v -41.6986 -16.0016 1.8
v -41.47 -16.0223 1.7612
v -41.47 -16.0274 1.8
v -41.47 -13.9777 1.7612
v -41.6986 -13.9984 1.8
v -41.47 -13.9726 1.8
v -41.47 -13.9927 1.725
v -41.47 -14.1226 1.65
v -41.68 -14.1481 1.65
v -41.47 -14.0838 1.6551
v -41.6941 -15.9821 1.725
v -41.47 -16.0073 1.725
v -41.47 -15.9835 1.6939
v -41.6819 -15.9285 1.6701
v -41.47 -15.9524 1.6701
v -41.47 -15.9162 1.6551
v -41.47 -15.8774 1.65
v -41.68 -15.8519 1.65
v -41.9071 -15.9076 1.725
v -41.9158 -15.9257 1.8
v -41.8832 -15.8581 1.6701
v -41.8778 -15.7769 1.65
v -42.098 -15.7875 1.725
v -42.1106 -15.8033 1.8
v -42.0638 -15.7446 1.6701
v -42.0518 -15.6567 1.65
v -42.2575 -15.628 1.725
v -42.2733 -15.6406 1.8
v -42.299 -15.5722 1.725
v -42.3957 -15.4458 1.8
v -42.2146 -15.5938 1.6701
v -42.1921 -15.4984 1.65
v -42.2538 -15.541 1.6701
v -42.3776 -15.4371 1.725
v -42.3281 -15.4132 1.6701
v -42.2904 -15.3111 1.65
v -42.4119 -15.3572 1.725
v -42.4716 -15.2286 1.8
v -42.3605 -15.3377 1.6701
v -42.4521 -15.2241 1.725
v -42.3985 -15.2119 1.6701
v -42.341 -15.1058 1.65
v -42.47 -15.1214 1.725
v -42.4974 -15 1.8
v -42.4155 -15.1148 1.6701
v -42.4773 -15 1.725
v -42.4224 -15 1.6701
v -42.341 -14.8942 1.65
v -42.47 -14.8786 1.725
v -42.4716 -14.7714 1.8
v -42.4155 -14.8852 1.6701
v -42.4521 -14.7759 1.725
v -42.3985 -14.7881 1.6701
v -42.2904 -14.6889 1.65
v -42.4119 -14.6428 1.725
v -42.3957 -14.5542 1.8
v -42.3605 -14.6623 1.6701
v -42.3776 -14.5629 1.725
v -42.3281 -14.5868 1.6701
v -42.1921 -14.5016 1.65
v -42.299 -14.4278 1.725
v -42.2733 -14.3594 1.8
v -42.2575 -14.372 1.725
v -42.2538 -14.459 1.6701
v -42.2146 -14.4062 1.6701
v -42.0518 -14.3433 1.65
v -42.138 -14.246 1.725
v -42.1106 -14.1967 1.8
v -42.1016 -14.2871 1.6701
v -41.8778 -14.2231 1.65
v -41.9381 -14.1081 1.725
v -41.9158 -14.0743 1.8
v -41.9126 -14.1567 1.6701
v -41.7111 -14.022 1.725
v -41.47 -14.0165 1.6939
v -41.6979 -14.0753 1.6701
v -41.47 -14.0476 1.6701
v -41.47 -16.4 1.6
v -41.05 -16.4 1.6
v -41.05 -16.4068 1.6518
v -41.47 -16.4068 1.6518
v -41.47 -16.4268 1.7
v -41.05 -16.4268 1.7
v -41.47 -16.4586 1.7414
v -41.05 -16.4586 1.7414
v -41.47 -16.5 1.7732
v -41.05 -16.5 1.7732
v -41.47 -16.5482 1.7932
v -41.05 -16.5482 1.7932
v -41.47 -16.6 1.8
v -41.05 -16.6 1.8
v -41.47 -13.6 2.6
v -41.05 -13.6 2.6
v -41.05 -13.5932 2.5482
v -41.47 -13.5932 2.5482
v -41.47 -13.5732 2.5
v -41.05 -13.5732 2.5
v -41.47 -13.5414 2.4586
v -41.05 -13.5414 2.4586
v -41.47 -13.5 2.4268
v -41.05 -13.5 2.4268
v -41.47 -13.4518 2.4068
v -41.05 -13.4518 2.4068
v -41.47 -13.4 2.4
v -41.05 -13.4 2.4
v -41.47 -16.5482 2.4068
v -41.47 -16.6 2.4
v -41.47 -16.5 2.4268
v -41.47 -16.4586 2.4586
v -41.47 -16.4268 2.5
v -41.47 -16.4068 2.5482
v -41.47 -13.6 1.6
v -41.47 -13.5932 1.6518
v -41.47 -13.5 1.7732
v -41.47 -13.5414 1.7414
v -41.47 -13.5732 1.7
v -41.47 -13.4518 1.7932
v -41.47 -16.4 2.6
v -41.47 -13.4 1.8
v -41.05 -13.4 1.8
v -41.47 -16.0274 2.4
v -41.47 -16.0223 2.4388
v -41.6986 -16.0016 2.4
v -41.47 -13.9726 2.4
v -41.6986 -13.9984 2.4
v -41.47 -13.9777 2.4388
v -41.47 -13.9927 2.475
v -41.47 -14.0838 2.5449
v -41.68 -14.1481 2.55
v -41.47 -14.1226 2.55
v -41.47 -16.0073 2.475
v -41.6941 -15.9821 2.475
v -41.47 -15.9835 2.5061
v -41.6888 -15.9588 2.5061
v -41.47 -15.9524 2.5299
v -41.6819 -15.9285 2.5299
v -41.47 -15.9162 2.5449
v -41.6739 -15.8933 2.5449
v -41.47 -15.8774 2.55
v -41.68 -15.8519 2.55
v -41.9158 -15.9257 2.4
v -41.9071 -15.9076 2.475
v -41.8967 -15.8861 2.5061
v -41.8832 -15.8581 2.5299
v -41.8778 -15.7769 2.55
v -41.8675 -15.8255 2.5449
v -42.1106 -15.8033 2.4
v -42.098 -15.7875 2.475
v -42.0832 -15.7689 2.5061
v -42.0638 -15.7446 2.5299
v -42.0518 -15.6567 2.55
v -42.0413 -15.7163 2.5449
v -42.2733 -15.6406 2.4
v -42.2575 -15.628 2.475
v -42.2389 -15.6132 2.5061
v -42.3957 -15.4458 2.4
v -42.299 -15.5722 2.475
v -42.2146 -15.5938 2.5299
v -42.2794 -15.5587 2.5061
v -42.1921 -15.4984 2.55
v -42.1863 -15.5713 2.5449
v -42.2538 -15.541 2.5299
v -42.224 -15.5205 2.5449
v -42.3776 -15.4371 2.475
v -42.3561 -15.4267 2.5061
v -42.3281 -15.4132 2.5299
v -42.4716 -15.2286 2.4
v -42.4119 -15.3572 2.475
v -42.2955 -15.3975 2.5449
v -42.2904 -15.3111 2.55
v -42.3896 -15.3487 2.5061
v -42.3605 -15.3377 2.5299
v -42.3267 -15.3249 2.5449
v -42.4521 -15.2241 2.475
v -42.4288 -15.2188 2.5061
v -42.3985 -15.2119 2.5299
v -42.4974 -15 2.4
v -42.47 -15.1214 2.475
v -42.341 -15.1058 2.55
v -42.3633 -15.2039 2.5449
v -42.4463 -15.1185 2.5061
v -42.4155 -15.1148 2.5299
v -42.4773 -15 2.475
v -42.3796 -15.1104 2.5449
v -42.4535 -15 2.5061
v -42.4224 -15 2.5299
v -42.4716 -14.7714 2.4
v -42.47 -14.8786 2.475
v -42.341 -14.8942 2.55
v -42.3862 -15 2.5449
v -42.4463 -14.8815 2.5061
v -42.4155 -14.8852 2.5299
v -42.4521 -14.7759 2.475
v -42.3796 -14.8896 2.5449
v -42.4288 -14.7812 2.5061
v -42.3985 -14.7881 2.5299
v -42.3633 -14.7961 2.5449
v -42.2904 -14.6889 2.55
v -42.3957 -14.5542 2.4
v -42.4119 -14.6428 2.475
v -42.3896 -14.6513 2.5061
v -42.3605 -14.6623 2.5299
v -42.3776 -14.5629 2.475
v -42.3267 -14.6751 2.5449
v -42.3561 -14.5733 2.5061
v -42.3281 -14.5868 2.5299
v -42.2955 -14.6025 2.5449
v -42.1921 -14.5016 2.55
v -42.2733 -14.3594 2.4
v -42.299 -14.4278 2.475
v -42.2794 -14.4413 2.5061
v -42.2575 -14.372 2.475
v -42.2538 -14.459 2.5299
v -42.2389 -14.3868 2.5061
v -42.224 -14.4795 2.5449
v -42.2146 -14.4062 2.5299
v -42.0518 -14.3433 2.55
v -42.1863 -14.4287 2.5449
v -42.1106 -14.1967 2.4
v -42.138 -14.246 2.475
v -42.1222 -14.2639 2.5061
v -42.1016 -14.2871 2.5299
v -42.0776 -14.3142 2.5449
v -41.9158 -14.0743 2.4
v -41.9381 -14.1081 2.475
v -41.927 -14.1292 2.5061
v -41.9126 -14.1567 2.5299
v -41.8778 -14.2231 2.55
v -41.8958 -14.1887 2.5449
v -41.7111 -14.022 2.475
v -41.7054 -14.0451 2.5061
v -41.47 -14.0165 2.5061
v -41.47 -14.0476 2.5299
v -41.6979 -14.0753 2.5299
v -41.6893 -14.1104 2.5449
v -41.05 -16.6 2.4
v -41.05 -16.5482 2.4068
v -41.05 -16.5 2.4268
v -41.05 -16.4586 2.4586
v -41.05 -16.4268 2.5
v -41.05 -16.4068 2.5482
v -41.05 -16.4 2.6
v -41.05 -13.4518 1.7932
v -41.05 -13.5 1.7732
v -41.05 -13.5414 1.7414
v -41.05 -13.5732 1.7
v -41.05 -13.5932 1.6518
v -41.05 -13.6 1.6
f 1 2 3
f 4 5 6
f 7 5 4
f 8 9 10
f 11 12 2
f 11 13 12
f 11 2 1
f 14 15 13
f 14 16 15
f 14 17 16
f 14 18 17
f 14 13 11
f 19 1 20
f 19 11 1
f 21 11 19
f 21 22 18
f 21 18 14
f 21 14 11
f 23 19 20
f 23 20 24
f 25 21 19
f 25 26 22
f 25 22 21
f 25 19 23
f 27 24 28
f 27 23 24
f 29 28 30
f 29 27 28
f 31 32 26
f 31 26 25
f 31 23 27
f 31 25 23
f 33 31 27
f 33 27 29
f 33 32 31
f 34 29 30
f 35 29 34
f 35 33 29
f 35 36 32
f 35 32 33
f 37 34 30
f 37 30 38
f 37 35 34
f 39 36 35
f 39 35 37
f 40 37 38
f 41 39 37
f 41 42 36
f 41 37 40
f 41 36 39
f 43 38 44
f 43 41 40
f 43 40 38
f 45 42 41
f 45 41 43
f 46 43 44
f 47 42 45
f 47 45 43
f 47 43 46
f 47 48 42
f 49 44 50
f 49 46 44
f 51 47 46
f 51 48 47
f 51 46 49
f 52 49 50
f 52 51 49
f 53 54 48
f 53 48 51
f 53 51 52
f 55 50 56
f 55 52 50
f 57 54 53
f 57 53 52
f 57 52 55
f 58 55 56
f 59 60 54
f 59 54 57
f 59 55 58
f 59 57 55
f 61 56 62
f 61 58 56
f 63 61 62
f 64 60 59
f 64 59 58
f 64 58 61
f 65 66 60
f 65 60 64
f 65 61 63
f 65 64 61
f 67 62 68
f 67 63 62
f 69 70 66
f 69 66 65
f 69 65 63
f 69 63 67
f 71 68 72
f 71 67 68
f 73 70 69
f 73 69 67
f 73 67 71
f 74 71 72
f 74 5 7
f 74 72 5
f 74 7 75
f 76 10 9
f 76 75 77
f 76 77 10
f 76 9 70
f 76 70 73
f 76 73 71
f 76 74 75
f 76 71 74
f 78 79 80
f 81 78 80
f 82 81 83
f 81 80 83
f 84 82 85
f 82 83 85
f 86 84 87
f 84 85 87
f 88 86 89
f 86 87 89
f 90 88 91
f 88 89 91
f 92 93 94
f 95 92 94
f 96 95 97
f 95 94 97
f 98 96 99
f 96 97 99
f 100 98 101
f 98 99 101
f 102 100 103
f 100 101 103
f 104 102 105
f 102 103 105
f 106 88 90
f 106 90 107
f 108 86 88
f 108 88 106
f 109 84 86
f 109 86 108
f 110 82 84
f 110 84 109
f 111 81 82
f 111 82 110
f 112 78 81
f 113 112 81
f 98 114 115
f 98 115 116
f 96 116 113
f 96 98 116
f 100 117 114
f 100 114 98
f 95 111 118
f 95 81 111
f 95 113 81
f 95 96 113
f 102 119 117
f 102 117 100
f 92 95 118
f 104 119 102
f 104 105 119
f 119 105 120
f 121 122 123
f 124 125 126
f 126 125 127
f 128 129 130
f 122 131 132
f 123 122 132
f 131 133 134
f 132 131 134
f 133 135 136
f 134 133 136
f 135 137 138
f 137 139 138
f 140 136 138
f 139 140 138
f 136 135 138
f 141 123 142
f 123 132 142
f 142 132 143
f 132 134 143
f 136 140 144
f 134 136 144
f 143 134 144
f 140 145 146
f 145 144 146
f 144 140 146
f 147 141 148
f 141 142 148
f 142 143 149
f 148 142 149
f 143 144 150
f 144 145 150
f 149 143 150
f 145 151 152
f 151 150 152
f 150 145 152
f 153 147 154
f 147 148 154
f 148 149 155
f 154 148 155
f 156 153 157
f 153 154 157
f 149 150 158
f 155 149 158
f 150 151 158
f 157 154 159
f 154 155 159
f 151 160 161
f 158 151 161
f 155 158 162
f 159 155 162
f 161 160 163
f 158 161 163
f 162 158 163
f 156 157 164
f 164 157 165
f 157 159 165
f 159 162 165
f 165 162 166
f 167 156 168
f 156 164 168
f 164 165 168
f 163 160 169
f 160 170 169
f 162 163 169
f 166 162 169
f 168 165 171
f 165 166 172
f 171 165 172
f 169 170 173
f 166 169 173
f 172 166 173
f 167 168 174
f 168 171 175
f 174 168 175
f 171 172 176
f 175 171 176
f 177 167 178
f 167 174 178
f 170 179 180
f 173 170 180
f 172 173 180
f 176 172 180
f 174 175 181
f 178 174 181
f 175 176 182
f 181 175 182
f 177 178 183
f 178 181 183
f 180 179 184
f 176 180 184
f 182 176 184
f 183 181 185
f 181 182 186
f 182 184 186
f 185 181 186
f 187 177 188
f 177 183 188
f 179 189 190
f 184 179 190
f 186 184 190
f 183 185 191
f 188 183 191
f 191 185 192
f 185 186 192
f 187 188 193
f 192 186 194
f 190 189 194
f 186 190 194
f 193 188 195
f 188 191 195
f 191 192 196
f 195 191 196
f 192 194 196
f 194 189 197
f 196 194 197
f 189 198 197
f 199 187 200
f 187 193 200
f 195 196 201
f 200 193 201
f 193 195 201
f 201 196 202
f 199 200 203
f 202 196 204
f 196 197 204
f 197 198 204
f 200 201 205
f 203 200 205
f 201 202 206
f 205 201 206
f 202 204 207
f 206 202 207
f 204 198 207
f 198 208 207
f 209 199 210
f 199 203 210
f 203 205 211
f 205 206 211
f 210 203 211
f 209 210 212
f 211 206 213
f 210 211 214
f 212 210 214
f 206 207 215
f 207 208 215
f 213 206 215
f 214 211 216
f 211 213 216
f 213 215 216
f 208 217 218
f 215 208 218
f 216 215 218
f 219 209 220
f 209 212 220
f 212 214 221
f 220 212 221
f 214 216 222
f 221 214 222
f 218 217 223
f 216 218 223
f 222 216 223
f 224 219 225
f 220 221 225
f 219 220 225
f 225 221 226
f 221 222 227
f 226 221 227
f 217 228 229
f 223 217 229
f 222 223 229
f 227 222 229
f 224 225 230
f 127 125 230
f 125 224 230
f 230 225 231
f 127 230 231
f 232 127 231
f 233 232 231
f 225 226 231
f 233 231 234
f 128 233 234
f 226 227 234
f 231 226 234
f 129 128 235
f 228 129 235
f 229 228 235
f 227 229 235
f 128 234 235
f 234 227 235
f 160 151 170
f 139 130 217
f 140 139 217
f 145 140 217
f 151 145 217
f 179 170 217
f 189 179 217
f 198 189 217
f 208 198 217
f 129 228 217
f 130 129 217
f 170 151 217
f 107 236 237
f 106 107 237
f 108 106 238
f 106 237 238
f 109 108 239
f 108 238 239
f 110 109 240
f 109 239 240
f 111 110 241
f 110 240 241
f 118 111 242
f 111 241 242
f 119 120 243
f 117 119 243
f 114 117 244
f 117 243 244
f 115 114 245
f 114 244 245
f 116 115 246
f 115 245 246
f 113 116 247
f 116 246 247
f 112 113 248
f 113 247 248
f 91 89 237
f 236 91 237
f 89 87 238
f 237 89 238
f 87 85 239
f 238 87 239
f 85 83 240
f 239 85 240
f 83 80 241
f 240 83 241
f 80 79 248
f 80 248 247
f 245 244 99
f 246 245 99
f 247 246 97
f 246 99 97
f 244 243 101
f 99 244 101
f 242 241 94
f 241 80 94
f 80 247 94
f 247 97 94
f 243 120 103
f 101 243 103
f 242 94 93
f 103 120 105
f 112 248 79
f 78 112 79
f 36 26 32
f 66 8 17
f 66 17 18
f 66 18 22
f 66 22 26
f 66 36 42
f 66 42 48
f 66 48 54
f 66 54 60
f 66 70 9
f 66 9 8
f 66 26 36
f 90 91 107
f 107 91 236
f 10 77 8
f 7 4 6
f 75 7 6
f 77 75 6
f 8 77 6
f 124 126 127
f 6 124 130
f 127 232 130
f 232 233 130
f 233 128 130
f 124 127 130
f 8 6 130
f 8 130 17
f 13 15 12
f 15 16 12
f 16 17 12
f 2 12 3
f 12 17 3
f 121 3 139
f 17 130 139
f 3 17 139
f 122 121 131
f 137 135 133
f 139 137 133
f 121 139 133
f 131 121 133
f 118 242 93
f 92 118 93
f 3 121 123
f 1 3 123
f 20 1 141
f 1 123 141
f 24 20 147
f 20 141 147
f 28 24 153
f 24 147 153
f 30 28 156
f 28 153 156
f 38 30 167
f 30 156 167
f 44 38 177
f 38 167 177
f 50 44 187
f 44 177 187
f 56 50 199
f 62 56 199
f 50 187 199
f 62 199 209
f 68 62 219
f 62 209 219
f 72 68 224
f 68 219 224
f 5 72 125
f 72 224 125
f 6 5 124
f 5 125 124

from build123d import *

# Parameters (mm, degrees)
DODANIE_WYCI_GNI_CIE1_DEPTH = 0.42
DODANIE_WYCI_GNI_CIE2_START = -0.05
DODANIE_WYCI_GNI_CIE2_DEPTH = 0.9
ZAOKR_GLENIE1_R             = 0.15


with BuildPart() as part:
    # Szkic1 → Dodanie-wyciągnięcie1 (new body)
    with BuildSketch(Plane(origin=(-41.05, 0, 0), x_dir=(0, 0, -1), z_dir=(1, 0, 0))):
        with BuildLine():
            Line((-2.400000095, -13.399999619), (-1.799999952, -13.399999619))
            ThreePointArc((-1.799999952, -13.399999619), (-1.74142138, -13.541421219), (-1.600000024, -13.600000381))
            Line((-1.600000024, -13.600000381), (-1.600000024, -16.399999619))
            ThreePointArc((-1.600000024, -16.399999619), (-1.741421625, -16.458578536), (-1.799999952, -16.600000381))
            Line((-1.799999952, -16.600000381), (-2.400000095, -16.600000381))
            ThreePointArc((-2.400000095, -16.600000381), (-2.458578346, -16.458578544), (-2.599999905, -16.399999619))
            Line((-2.599999905, -16.399999619), (-2.599999905, -13.600000381))
            ThreePointArc((-2.599999905, -13.600000381), (-2.458578346, -13.541421456), (-2.400000095, -13.399999619))
        make_face()
    extrude(amount=-DODANIE_WYCI_GNI_CIE1_DEPTH)


with BuildPart() as body_2:
    # Szkic2 → Dodanie-wyciągnięcie2 (new body)
    with BuildSketch(Plane.XY.offset(2.599999905).offset(DODANIE_WYCI_GNI_CIE2_START)):
        with BuildLine():
            Line((-41.47, -13.972591173), (-41.47, -16.027408827))
            ThreePointArc((-41.47, -16.027408827), (-42.497408827, -15), (-41.47, -13.972591173))
        make_face()
    extrude(amount=-DODANIE_WYCI_GNI_CIE2_DEPTH)

    # Zaokrąglenie1
    zaokr_glenie1_edges = [body_2.edges().sort_by_distance(p)[0] for p in [
        (-42.497408827, -15, 2.549999905),
        (-42.497408827, -15, 1.649999905),
    ]]
    fillet(zaokr_glenie1_edges, radius=ZAOKR_GLENIE1_R)


solid = Compound([part.part, body_2.part])
